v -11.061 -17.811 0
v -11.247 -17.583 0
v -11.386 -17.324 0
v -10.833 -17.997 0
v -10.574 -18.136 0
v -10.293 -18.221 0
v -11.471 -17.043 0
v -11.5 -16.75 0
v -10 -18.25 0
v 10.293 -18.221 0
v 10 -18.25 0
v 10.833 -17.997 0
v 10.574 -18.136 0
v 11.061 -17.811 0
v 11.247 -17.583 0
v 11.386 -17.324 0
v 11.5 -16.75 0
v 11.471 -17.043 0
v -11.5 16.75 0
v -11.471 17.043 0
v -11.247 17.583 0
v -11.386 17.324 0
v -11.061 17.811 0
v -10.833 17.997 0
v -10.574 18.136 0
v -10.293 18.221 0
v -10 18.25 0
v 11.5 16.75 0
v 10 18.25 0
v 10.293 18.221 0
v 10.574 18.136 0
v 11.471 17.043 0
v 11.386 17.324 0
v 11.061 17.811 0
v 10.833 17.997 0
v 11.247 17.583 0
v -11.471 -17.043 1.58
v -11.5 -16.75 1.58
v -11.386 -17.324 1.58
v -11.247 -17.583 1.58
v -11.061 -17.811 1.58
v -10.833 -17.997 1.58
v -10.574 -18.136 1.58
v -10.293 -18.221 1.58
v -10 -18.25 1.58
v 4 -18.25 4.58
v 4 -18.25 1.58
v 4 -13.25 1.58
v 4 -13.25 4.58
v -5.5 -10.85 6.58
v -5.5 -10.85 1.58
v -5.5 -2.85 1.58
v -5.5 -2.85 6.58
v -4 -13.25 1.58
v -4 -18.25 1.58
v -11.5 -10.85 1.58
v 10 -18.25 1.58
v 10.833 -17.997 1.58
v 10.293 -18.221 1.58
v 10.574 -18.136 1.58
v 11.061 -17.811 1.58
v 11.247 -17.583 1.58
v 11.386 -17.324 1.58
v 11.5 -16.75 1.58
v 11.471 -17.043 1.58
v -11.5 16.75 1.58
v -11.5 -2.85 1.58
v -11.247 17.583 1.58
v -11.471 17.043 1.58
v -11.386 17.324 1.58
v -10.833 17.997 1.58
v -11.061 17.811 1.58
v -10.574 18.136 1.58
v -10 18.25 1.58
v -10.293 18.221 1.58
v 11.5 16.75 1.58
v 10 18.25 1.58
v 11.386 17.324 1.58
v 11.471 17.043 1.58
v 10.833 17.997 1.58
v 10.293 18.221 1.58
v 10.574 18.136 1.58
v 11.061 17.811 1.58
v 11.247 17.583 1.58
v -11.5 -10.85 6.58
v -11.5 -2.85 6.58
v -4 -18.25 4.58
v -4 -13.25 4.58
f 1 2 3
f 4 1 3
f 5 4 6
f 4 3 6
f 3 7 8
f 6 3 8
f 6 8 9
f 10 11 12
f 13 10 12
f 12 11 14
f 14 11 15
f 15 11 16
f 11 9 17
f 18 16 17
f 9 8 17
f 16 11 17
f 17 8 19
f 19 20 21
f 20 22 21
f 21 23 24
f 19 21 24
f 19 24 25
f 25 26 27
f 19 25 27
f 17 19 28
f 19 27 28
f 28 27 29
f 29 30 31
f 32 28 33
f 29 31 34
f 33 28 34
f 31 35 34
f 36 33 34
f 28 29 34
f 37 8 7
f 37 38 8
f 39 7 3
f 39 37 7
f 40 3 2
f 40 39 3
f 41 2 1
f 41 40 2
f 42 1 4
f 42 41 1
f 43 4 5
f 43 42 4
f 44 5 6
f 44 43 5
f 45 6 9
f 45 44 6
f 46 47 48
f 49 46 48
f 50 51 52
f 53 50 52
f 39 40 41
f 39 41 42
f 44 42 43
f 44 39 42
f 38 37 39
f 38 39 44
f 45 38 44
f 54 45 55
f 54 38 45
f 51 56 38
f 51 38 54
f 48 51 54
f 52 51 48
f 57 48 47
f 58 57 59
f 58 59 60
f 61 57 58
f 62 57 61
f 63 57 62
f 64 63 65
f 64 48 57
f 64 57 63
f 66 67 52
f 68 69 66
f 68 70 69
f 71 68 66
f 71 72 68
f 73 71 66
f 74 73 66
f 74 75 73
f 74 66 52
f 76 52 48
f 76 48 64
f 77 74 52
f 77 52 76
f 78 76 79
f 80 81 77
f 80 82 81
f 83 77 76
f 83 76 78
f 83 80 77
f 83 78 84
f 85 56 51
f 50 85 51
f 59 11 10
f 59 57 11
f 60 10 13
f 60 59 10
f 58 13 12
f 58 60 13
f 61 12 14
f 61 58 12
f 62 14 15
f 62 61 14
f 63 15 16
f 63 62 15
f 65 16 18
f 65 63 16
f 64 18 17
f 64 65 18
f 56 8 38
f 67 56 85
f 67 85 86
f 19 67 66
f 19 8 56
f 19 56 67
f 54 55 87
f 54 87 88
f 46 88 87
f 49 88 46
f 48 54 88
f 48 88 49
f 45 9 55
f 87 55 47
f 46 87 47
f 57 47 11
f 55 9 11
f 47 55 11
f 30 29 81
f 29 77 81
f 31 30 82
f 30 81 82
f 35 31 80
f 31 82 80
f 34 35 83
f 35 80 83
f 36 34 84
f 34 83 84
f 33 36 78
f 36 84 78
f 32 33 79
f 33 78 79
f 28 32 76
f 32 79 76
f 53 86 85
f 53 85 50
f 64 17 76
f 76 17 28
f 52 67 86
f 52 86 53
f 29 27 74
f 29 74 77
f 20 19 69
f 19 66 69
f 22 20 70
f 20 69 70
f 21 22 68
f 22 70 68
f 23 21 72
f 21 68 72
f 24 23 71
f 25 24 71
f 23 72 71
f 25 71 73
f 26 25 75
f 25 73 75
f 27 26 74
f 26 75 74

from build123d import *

# Parameters (mm, degrees)
F0_W     = 23
F0_H     = 36.5
F1_DEPTH = 1.58
F2_W     = 8
F2_H     = 5
F3_DEPTH = 3
F2_W_2   = 6
F2_H_2   = 8
F4_DEPTH = 5
F5_R     = 1.5


with BuildPart() as f1:
    # F0 (on Top) → F1 (new body)
    with BuildSketch(Plane.XY):
        Rectangle(F0_W, F0_H)
    extrude(amount=F1_DEPTH)

    # F2 (on face) → F3 (join)
    with BuildSketch(Plane.XY.offset(1.58)):
        with Locations((0, -15.75)):
            Rectangle(F2_W, F2_H)
    extrude(amount=F3_DEPTH)

    # F2 (on face) → F4 (join)
    with BuildSketch(Plane.XY.offset(1.58)):
        with Locations((-8.5, -6.85)):
            Rectangle(F2_W_2, F2_H_2)
    extrude(amount=F4_DEPTH)

    # F5
    f5_edges = [f1.edges().sort_by_distance(p)[0] for p in [
        (-11.5, -18.25, 0.79),
        (11.5, -18.25, 0.79),
        (11.5, 18.25, 0.79),
        (-11.5, 18.25, 0.79),
    ]]
    fillet(f5_edges, radius=F5_R)


solid = f1.part
